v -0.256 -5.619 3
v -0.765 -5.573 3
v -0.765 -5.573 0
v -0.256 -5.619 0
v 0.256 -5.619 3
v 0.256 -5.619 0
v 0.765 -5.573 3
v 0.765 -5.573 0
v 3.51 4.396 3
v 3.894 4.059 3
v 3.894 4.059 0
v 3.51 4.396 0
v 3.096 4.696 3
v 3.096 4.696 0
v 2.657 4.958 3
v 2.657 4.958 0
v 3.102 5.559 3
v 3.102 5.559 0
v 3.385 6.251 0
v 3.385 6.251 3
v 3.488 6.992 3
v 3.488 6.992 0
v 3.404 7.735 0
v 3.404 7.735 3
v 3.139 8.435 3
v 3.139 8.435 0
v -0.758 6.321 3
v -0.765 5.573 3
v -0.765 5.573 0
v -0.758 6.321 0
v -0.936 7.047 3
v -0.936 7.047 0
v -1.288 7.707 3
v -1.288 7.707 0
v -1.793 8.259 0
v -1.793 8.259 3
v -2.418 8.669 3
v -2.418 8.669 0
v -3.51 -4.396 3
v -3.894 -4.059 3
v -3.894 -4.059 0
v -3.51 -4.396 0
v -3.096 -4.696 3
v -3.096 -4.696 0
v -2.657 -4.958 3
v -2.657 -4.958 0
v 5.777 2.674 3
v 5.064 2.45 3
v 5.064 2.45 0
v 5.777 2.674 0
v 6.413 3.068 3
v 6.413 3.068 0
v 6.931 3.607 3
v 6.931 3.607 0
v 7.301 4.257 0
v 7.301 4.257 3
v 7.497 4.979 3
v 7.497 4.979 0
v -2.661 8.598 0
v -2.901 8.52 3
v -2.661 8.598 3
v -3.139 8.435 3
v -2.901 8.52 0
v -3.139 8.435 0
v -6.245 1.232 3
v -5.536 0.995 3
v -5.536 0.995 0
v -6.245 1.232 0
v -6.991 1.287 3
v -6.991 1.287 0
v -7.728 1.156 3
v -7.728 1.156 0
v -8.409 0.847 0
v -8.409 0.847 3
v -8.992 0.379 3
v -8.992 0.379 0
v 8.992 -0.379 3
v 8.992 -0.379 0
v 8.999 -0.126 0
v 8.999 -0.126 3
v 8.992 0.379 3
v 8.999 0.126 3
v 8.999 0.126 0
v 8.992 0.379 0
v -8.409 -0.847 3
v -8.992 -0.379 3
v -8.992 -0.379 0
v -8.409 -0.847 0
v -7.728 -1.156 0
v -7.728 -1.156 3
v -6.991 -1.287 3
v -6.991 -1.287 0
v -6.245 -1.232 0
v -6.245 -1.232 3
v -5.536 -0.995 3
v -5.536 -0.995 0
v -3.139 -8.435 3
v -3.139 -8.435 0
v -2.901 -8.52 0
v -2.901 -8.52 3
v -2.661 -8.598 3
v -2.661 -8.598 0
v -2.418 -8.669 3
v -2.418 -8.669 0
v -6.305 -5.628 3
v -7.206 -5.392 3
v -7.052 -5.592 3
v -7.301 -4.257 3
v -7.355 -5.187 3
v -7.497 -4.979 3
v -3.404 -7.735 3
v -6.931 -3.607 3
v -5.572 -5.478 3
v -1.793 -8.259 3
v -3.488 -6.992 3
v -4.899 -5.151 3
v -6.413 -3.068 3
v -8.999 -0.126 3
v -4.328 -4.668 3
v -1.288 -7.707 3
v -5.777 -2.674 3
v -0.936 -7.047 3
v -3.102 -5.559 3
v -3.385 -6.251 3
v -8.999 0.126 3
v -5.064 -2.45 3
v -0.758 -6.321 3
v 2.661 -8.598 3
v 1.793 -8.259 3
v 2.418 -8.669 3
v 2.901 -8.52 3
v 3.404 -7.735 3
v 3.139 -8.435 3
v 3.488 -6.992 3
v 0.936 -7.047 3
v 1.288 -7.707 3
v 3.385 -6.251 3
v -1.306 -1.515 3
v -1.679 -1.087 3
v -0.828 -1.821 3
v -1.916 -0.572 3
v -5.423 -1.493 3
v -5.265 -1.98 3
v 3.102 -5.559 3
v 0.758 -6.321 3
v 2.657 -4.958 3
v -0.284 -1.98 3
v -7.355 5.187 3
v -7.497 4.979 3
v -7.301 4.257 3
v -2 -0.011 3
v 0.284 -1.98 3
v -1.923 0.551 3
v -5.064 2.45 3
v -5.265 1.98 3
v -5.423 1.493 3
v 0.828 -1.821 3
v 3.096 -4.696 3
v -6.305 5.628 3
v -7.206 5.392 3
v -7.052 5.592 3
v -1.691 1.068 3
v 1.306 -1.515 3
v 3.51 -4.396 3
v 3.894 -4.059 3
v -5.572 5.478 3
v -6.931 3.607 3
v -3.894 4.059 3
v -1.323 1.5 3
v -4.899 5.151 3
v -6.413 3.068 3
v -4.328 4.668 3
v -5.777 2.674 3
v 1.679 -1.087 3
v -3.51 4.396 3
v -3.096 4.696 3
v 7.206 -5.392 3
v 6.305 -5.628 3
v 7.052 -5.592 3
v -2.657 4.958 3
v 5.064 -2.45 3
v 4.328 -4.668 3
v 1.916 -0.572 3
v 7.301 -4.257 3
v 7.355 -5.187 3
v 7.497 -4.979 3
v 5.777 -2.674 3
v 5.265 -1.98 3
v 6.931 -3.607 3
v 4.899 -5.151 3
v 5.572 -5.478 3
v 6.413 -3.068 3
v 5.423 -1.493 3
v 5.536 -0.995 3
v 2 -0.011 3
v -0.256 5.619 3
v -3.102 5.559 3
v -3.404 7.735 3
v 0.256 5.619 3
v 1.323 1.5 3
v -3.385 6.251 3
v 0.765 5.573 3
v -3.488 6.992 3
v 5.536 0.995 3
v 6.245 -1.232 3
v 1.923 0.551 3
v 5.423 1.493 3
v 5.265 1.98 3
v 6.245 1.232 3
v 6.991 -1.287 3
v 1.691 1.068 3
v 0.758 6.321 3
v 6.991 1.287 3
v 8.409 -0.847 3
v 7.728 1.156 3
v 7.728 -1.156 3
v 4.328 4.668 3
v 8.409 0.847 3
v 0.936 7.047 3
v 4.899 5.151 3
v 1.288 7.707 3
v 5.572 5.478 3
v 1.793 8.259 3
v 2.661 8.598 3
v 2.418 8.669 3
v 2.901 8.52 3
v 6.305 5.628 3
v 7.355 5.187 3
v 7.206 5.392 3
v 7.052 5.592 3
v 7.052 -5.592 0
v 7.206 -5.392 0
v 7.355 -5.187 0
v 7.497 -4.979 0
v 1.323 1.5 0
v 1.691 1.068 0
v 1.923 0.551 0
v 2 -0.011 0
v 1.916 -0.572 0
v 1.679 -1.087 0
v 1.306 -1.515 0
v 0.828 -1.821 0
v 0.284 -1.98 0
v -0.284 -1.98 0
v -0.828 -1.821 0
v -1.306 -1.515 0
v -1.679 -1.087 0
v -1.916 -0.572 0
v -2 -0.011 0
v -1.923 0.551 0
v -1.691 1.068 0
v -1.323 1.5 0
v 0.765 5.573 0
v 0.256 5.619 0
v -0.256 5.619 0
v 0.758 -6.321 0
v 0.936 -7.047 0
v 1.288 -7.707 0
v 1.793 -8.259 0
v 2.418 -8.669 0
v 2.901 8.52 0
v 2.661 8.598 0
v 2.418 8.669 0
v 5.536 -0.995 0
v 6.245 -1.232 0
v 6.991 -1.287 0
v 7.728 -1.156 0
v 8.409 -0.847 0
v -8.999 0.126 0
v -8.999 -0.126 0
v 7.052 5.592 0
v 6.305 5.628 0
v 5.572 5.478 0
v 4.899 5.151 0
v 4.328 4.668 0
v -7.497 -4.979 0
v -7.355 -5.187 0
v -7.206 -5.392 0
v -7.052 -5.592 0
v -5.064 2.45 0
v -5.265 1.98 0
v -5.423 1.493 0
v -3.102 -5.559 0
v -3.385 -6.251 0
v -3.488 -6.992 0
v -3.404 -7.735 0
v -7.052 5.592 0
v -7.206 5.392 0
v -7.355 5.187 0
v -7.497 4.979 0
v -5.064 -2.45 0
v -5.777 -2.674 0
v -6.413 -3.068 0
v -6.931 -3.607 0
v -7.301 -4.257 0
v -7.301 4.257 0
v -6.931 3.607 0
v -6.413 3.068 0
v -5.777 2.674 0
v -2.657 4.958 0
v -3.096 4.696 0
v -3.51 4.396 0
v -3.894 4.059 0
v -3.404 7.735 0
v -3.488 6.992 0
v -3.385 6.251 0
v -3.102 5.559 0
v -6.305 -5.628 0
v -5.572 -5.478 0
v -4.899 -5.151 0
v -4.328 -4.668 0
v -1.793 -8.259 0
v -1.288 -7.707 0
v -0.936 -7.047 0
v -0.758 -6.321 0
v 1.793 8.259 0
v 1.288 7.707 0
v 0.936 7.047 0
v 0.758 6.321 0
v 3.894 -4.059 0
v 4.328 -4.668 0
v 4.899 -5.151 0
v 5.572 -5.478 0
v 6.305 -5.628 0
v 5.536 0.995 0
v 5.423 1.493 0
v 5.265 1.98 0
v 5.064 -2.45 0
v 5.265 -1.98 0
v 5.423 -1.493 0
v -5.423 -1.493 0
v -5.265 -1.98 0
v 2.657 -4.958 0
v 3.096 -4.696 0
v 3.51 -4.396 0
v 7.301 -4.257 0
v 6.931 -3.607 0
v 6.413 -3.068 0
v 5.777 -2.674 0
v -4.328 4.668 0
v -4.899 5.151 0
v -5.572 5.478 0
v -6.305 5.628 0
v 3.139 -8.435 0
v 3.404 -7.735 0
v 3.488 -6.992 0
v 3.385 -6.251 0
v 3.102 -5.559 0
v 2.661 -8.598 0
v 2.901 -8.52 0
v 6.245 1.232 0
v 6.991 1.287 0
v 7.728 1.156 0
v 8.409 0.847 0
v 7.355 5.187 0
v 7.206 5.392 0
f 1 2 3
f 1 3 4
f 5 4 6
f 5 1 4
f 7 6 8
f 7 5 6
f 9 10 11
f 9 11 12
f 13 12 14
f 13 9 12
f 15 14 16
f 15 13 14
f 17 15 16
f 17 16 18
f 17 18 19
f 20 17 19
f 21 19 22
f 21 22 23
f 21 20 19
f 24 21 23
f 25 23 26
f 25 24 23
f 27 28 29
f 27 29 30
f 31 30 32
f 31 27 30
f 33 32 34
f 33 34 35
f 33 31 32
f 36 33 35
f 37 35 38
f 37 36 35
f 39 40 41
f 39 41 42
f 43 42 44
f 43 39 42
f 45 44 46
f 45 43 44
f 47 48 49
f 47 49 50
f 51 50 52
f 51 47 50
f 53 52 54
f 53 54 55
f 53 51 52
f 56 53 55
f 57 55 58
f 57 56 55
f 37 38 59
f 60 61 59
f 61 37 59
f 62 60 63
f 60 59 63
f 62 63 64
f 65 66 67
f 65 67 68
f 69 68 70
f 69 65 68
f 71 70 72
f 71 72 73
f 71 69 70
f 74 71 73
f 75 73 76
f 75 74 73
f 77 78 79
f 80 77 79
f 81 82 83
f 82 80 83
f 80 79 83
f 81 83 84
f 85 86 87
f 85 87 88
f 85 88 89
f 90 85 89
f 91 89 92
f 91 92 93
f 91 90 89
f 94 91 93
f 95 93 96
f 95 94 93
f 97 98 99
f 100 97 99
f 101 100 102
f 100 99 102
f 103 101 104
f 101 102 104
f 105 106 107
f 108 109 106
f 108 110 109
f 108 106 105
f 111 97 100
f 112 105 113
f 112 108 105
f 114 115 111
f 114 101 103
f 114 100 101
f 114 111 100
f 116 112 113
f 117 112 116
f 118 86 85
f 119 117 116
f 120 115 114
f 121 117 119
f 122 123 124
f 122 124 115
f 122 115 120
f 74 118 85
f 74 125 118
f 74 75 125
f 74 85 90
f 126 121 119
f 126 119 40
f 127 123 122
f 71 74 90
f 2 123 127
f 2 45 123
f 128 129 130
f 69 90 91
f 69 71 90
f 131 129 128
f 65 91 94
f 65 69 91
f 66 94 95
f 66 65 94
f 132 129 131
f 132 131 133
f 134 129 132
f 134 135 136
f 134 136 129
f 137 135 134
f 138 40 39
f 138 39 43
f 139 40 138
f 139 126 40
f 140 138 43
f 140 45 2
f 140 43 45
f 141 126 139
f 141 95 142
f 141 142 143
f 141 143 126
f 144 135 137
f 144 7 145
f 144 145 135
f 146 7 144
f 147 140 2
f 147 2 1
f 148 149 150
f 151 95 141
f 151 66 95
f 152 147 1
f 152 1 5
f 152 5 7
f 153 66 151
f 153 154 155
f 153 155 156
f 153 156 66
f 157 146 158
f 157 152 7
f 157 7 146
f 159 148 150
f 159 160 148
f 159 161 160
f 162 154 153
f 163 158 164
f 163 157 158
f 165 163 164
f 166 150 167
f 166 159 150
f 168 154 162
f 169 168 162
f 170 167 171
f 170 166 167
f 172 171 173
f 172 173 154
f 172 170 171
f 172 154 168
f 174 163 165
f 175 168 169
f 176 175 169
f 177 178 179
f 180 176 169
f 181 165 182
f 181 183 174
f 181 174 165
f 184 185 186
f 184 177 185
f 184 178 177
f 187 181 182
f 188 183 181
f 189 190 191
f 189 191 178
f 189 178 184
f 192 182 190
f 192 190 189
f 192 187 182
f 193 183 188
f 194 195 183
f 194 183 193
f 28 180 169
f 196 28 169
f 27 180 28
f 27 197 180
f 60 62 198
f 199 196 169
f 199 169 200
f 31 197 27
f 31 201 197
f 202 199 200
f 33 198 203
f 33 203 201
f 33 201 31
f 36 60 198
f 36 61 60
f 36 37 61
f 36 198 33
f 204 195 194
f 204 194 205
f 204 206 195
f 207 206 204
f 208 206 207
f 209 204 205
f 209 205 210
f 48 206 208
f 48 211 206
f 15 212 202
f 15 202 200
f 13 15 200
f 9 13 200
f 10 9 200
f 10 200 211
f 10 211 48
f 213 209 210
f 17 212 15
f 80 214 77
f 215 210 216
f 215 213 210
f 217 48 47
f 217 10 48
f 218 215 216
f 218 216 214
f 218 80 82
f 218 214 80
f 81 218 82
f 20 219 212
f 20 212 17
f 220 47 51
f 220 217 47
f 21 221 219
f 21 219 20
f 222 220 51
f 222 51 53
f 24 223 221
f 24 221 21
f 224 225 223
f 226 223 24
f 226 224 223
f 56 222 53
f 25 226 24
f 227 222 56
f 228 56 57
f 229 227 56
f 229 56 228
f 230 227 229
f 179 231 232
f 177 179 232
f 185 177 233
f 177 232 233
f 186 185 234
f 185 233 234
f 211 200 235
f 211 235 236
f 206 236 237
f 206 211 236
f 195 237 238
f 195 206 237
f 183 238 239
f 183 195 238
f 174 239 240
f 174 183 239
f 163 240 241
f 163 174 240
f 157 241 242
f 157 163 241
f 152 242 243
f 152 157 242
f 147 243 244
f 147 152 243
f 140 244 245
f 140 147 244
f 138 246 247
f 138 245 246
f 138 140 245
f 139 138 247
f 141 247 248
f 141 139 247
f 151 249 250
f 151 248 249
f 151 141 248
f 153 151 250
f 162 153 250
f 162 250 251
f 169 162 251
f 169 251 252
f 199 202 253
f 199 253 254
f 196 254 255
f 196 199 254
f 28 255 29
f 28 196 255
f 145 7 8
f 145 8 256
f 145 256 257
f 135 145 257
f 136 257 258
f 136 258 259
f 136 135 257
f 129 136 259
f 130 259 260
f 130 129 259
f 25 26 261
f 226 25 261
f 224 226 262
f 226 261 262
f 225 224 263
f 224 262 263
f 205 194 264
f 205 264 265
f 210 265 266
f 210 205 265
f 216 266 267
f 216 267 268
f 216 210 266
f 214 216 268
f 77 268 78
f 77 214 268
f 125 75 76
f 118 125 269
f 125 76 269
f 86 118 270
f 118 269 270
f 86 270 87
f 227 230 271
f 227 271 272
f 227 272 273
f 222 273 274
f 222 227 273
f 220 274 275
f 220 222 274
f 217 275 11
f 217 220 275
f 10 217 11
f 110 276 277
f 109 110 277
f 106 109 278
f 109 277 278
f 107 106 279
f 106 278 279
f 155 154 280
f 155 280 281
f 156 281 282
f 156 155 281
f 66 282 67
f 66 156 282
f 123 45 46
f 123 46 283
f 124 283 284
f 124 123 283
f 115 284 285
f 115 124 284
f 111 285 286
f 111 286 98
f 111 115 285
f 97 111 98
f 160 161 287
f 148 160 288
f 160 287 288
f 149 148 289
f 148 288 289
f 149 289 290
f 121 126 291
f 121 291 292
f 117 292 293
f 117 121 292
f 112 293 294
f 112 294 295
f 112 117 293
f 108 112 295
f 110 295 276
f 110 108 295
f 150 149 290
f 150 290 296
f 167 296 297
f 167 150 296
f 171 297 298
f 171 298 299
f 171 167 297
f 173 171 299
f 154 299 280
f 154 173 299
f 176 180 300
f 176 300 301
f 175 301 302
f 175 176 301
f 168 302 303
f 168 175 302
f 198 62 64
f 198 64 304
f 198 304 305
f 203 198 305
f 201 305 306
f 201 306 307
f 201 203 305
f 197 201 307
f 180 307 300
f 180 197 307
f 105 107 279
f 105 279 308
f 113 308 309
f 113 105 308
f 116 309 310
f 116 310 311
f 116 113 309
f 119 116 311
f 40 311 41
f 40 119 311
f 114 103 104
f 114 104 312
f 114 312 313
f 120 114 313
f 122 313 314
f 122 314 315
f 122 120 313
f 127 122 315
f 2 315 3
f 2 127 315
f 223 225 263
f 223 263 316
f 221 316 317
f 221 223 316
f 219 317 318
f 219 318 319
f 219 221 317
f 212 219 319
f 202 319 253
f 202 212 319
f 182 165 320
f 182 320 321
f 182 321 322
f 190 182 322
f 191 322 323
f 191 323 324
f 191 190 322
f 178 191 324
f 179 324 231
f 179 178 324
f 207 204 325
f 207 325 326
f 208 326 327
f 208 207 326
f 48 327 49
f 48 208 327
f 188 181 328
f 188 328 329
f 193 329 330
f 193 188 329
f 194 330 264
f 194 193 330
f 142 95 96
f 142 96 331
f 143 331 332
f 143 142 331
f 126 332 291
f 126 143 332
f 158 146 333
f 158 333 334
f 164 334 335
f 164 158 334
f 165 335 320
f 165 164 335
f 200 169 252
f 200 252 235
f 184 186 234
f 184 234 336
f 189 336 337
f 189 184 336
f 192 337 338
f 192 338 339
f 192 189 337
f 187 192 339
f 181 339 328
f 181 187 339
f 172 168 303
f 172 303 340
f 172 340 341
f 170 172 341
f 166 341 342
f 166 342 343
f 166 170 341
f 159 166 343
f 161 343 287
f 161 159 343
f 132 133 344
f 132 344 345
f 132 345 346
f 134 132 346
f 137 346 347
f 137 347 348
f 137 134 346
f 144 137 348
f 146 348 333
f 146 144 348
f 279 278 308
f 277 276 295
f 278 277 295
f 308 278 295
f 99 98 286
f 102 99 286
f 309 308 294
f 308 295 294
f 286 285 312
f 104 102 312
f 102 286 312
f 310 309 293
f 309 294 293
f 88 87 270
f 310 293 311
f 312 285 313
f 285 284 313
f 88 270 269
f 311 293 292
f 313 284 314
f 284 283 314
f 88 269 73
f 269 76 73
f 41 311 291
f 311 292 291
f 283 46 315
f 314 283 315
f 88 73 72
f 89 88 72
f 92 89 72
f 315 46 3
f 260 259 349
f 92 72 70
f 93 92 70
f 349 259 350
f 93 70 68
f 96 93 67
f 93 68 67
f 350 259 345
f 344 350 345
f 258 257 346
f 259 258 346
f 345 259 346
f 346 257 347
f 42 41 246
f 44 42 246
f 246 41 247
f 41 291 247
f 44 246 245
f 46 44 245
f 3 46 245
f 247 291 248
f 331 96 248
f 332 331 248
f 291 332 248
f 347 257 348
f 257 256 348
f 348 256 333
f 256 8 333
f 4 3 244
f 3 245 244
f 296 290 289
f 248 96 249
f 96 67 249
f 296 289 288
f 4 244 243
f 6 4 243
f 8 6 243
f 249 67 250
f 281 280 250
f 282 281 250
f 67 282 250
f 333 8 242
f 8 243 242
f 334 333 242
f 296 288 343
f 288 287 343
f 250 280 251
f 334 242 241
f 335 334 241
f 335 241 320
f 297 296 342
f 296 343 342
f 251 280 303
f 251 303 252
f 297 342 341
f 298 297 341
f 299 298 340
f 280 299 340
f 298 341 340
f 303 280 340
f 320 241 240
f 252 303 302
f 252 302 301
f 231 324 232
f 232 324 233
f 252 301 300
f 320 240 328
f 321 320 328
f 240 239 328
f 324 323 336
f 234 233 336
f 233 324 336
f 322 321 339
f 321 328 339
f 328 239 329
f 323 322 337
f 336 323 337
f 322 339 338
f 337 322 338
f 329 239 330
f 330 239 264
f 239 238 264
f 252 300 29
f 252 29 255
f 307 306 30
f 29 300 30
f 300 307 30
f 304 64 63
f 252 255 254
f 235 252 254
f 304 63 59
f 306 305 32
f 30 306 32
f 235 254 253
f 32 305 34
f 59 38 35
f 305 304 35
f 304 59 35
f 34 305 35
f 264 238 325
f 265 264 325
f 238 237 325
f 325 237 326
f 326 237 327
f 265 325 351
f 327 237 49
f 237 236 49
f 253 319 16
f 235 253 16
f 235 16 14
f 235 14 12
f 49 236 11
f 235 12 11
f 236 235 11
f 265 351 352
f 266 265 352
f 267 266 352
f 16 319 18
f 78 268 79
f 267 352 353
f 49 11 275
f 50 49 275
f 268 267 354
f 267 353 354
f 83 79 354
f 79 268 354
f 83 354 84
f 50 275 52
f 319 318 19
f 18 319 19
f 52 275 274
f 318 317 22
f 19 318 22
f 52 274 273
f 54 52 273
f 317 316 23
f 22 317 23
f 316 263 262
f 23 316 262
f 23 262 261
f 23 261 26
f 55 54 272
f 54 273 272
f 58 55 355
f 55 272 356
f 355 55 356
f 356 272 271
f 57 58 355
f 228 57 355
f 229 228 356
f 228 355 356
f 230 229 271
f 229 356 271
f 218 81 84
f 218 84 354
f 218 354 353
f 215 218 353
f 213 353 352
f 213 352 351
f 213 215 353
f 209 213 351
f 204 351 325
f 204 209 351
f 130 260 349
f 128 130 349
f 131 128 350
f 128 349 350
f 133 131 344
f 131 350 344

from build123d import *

# Parameters (mm, degrees)
SKETCH1_R           = 9
BOSS_EXTRUDE1_DEPTH = 3
CUT_EXTRUDE1_DEPTH  = 14.076696831
CIRPATTERN1_COUNT   = 10
CUT_EXTRUDE3_DEPTH  = 13.851135167


with BuildPart() as part:
    # Sketch1 → Boss-Extrude1 (new body)
    with BuildSketch(Plane.XY):
        Circle(SKETCH1_R)
    extrude(amount=BOSS_EXTRUDE1_DEPTH)

    # Sketch2 → Cut-Extrude1 (cut, through all)
    with BuildSketch(Plane.XY.offset(3)):
        with BuildLine():
            ThreePointArc((-2.41833102, 8.669006579), (0, 9), (2.41833102, 8.669006579))
            ThreePointArc((2.41833102, 8.669006579), (1.091553585, 7.387918037), (0.76495134, 5.572743889))
            ThreePointArc((0.76495134, 5.572743889), (0, 5.625), (-0.76495134, 5.572743889))
            ThreePointArc((-0.76495134, 5.572743889), (-1.091553585, 7.387918037), (-2.41833102, 8.669006579))
        make_face()
    cut_extrude1 = extrude(amount=-CUT_EXTRUDE1_DEPTH, mode=Mode.SUBTRACT)

    # CirPattern1: Cut-Extrude1 ×10 about axis
    cirpattern1_axis = Axis((0, 0, 0), (0, 0, 1))
    for i in range(1, CIRPATTERN1_COUNT):
        add(cut_extrude1.rotate(cirpattern1_axis, i * 360 / CIRPATTERN1_COUNT), mode=Mode.SUBTRACT)

    # Sketch4 → Cut-Extrude3 (cut, through all)
    with BuildSketch(Plane.XY.offset(3)):
        with BuildLine():
            Line((-1.322875656, 1.5), (1.322875656, 1.5))
            ThreePointArc((1.322875656, 1.5), (0, -2), (-1.322875656, 1.5))
        make_face()
    extrude(amount=-CUT_EXTRUDE3_DEPTH, mode=Mode.SUBTRACT)


solid = part.part
